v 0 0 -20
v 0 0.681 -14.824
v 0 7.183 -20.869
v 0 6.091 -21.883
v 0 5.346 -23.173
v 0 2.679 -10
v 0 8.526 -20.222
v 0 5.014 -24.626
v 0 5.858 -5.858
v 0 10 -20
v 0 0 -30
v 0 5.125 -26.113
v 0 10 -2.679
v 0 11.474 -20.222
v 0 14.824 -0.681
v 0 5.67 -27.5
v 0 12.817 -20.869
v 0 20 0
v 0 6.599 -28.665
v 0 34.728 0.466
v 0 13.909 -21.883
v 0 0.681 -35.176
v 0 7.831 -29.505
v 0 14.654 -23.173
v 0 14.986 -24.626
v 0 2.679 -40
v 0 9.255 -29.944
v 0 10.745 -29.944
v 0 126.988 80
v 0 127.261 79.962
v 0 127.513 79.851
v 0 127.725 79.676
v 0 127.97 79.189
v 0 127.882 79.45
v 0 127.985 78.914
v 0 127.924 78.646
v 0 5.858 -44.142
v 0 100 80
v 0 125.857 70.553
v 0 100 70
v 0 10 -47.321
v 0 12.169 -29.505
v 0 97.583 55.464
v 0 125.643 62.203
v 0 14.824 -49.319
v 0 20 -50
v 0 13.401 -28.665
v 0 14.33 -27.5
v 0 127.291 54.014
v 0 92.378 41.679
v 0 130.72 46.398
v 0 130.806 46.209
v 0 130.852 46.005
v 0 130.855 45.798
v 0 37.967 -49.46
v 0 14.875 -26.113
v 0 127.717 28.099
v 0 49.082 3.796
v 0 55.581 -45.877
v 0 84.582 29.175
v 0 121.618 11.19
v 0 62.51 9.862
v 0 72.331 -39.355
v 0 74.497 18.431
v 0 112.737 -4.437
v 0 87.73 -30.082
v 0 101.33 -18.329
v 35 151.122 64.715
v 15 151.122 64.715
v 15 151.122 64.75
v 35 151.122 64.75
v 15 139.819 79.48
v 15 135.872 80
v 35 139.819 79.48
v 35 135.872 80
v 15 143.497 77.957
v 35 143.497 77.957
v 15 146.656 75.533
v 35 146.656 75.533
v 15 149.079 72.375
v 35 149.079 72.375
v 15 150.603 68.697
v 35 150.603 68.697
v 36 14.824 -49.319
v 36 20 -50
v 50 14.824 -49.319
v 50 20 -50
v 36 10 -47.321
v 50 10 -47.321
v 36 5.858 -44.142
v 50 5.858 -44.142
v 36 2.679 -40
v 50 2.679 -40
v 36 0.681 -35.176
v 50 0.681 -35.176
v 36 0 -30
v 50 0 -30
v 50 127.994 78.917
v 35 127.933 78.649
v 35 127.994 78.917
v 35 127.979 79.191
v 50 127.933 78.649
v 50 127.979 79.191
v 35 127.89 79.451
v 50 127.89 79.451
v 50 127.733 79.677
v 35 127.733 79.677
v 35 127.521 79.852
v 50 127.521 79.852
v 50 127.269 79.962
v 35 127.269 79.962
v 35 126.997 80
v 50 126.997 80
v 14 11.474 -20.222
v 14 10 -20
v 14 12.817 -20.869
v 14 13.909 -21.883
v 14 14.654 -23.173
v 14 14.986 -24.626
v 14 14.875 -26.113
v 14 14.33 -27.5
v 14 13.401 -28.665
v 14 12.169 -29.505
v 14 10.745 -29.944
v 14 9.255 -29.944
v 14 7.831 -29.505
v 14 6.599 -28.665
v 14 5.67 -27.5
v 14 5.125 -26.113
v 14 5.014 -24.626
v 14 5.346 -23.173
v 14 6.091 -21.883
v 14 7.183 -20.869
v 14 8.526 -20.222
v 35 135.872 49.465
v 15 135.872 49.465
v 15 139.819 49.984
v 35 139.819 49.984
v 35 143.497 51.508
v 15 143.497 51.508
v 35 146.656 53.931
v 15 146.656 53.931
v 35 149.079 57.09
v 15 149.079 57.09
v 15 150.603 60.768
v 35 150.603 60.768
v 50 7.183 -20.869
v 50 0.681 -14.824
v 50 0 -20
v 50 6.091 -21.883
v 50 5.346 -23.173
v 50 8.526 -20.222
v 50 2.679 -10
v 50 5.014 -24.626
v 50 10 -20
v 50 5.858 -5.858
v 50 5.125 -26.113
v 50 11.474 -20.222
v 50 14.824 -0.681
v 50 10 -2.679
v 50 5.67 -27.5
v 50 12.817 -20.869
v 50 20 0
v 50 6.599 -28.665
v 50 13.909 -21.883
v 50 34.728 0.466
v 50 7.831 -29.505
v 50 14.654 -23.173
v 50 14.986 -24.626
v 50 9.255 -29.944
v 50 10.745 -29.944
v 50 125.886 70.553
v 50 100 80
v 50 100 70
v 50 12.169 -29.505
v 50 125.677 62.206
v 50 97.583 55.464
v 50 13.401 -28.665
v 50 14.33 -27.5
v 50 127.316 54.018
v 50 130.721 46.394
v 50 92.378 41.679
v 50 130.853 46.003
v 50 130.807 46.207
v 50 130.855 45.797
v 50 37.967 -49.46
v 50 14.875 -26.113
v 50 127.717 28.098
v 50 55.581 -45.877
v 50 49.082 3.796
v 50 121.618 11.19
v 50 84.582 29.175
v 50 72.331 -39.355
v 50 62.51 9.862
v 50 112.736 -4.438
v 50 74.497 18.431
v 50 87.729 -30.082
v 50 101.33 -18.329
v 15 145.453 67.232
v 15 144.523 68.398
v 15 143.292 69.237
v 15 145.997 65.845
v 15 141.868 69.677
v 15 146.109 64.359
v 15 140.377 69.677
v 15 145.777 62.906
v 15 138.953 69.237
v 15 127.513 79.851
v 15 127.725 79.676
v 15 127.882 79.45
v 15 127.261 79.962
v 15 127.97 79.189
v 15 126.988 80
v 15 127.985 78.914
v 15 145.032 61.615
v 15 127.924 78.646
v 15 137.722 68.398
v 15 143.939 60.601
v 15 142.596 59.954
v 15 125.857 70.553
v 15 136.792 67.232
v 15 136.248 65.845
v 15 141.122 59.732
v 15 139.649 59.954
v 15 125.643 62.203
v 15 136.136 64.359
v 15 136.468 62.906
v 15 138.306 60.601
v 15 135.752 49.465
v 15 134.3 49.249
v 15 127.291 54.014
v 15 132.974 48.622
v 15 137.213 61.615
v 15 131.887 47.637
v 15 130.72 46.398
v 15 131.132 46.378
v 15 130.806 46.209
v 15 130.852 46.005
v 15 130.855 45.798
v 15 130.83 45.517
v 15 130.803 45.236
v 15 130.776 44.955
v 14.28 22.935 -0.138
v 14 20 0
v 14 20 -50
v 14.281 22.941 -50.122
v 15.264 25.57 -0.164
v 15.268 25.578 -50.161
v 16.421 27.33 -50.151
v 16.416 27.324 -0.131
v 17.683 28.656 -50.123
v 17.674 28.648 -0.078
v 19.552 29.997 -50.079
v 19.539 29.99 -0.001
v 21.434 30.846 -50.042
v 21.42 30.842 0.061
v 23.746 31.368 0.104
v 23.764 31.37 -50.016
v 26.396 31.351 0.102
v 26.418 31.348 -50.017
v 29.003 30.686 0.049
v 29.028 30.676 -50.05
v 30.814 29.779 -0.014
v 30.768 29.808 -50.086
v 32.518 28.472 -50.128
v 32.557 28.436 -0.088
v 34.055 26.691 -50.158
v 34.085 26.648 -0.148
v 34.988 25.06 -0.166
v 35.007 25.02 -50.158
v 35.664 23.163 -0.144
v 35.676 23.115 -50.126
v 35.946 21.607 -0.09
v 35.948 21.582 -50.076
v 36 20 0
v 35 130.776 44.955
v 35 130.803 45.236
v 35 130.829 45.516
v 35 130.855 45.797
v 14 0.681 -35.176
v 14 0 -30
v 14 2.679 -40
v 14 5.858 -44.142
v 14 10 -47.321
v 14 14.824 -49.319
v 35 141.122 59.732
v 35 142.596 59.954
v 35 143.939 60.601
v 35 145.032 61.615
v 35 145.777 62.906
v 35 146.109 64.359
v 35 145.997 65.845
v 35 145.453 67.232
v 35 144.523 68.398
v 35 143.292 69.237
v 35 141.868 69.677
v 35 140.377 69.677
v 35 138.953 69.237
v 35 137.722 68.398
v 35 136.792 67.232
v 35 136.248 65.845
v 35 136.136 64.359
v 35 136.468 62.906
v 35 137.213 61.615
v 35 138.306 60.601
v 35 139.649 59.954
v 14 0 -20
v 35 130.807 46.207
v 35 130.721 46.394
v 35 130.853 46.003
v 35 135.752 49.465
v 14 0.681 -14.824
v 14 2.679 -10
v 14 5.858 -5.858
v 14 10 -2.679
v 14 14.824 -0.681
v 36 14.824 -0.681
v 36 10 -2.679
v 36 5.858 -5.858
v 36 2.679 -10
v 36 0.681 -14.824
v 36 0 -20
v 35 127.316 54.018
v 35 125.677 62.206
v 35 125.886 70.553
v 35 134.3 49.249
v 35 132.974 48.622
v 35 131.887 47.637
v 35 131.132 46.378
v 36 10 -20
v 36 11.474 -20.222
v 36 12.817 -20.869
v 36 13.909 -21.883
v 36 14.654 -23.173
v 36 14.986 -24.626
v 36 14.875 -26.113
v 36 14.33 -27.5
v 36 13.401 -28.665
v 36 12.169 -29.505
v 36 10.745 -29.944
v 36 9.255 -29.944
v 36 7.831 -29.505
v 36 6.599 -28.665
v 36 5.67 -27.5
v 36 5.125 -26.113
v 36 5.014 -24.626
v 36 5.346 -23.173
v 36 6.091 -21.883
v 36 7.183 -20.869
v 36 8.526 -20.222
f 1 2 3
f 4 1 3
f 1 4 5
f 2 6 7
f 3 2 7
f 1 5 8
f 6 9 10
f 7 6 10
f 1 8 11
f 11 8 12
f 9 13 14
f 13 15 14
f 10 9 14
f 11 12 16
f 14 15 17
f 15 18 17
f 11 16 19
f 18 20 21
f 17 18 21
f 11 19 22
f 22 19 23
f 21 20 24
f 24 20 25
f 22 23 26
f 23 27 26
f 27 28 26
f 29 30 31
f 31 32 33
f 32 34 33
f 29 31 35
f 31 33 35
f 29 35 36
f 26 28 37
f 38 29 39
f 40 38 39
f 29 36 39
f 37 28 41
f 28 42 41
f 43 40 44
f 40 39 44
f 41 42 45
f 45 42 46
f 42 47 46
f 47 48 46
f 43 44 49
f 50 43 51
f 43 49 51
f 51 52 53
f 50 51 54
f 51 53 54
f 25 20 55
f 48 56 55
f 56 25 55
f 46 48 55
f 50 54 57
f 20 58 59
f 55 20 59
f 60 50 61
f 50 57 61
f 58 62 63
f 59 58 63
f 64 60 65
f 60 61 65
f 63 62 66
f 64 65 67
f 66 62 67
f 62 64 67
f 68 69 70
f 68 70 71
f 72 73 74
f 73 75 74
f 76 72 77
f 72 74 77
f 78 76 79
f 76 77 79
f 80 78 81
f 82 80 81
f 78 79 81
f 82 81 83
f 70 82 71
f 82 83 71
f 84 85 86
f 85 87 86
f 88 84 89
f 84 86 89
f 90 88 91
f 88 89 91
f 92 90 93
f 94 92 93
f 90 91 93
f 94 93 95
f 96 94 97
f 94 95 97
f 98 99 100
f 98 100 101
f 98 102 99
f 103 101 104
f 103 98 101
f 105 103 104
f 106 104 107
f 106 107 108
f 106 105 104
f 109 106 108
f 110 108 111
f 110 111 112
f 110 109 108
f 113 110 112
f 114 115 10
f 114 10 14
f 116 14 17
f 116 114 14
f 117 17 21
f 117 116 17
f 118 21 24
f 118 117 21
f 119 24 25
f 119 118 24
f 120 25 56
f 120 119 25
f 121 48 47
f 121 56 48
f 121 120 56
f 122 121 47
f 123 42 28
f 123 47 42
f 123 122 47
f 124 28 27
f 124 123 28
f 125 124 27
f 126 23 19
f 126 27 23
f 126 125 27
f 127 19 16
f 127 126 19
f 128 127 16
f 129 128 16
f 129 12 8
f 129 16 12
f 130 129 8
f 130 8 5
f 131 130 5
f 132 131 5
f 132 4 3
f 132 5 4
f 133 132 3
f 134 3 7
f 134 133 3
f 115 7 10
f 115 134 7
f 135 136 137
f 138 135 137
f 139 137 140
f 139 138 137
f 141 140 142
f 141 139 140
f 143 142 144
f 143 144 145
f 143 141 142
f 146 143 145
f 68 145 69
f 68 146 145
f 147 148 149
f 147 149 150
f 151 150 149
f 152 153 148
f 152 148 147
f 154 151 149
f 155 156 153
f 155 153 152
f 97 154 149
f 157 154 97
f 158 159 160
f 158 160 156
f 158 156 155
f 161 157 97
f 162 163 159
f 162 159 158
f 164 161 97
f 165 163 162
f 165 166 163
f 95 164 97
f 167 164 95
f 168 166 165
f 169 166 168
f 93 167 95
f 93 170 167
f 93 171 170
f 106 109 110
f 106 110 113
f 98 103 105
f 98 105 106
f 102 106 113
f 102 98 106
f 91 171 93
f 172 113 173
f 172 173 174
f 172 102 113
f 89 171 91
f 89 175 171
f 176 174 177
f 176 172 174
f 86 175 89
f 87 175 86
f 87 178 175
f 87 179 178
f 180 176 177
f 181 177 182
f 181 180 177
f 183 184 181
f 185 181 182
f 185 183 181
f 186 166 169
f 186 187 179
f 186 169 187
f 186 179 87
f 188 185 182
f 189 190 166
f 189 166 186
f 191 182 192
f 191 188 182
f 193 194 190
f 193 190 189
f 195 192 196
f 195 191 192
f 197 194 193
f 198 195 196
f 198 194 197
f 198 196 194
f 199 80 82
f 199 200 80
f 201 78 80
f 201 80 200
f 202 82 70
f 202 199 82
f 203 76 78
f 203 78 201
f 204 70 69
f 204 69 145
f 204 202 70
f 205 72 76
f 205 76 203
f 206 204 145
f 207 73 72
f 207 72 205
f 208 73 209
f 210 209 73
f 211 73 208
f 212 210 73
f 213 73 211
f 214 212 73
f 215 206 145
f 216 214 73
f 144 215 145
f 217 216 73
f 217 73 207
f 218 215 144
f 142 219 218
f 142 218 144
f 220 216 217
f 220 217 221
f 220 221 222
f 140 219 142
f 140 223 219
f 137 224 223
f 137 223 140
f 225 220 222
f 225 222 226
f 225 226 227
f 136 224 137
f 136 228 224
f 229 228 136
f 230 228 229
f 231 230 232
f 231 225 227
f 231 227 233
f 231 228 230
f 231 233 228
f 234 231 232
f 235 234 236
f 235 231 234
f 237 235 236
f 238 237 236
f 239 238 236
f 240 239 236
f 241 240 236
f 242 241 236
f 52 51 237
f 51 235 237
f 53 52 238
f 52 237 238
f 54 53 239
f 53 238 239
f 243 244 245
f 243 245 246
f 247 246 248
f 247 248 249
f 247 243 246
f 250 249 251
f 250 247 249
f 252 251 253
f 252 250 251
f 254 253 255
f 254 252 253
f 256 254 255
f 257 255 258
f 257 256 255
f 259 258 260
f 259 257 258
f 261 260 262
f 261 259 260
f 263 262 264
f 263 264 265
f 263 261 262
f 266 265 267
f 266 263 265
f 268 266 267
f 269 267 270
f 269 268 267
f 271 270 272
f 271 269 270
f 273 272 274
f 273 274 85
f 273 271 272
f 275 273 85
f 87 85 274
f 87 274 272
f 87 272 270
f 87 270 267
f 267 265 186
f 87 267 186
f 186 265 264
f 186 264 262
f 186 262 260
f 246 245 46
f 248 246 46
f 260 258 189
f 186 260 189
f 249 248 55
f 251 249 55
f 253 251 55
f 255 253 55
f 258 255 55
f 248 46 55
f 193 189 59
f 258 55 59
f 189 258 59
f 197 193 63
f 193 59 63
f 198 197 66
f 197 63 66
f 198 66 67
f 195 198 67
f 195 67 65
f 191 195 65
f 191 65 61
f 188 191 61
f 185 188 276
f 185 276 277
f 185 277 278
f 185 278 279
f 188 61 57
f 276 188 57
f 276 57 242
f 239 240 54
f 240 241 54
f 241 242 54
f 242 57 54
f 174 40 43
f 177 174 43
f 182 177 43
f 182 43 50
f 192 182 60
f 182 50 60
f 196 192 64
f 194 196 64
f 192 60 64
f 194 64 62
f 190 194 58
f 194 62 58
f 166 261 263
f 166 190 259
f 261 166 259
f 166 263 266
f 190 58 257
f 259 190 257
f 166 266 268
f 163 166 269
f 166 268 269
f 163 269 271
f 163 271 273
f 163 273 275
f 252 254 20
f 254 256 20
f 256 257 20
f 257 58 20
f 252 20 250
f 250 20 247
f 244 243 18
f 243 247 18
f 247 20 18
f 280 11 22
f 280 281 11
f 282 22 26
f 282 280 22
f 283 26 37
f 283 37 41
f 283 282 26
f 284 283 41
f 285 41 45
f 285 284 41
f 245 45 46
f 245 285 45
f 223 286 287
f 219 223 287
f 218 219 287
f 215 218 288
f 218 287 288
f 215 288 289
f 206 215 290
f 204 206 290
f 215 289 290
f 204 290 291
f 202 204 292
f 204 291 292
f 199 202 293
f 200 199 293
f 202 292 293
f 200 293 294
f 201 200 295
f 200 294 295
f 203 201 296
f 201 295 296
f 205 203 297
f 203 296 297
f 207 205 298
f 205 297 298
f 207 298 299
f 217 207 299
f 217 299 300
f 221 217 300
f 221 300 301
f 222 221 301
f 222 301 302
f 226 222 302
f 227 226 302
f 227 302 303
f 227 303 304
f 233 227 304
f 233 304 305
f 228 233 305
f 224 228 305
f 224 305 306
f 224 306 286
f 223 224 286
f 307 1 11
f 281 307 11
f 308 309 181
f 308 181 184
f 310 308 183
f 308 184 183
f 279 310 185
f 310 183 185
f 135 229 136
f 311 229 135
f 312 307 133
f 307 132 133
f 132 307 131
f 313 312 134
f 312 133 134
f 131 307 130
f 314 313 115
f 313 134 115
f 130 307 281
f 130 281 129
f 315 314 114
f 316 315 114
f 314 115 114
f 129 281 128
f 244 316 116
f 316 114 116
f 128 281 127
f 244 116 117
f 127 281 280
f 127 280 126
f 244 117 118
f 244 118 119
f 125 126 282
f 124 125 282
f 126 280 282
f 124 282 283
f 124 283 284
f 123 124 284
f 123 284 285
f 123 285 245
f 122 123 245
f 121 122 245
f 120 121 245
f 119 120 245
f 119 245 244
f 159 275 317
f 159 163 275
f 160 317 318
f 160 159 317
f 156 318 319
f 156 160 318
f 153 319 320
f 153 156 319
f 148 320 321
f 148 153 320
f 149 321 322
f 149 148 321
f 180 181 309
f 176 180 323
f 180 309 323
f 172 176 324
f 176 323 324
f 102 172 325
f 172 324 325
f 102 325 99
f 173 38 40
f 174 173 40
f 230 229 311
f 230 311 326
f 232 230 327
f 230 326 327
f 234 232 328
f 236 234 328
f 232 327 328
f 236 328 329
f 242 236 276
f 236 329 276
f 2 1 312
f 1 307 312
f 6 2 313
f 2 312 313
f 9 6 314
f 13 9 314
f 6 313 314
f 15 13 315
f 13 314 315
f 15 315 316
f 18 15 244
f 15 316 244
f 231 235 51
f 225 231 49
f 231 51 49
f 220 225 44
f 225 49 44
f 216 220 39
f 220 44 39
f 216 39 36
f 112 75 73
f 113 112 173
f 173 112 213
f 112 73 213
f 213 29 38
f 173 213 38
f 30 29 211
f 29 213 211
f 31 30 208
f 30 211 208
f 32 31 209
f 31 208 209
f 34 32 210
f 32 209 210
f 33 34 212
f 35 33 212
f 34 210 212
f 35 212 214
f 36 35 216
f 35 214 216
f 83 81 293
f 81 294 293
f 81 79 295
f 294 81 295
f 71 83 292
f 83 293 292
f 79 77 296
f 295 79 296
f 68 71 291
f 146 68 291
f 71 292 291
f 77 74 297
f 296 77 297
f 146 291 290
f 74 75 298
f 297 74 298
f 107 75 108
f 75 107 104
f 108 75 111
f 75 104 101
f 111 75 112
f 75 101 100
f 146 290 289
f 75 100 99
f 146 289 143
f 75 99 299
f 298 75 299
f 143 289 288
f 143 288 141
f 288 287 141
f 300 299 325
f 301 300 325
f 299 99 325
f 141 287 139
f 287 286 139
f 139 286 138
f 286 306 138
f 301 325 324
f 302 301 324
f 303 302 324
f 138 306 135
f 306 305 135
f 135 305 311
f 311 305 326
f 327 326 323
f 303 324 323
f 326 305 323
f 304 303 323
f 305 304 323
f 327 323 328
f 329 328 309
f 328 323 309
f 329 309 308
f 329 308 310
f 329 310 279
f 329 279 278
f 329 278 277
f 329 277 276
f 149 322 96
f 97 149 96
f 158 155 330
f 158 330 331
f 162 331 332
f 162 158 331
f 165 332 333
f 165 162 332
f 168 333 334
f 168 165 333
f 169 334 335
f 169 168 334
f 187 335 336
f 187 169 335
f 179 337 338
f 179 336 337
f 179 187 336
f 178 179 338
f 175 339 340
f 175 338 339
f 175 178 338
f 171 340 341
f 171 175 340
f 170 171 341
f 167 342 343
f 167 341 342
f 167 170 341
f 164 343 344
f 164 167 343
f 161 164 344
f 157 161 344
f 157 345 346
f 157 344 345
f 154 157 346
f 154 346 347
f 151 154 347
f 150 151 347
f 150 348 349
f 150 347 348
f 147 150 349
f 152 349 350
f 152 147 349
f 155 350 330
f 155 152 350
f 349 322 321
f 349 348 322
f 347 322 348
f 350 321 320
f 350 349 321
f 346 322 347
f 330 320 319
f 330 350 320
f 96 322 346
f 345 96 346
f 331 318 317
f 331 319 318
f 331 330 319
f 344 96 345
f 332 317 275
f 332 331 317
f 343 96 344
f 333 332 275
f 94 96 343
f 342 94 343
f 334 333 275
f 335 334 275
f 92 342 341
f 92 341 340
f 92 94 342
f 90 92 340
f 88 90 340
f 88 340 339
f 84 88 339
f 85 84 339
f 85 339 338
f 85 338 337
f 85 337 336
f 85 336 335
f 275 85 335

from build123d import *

# Parameters (mm, degrees)
BOSS_EXTRUDE1_DEPTH     = 50
SKETCH3_W               = 22
SKETCH3_H               = 20
CUT_EXTRUDE2_DEPTH      = 192.293252092
CUT_EXTRUDE3_DEPTH      = 158.762822921
CUT_EXTRUDE3_DEPTH_BACK = 158.762822921
SKETCH4_R               = 5
FILLET3_R               = 20
CUT_EXTRUDE4_DEPTH      = 162.533613518
CUT_EXTRUDE4_DEPTH_BACK = 162.533613518
SKETCH6_W               = 20
SKETCH6_H               = 30.53527662
BOSS_EXTRUDE2_DEPTH     = 20
SKETCH7_R               = 5
CUT_EXTRUDE5_DEPTH      = 175.536552167
FILLET4_R               = 15.25
FILLET8_R               = 5
CUT_EXTRUDE7_START      = -15
CUT_EXTRUDE7_DEPTH      = 15
CUT_EXTRUDE8_DEPTH      = 15
FILLET13_R              = 1


with BuildPart() as part:
    # Sketch2 → Boss-Extrude1 (new body)
    with BuildSketch(Plane(origin=(0, 0, 0), x_dir=(0, 0, -1), z_dir=(1, 0, 0))):
        with BuildLine():
            Line((0, 0), (50, 0))
            Line((50, 0), (50, 20))
            ThreePointArc((50, 20), (23.281860252, 96.16106544), (-49.46472338, 131.122493479))
            Line((-49.46472338, 131.122493479), (-80, 131.122493479))
            Line((-80, 131.122493479), (-80, 100))
            Line((-80, 100), (-70, 100))
            ThreePointArc((-70, 100), (-18.431457505, 74.497474683), (0, 20))
            Line((0, 20), (0, 0))
        make_face()
    extrude(amount=BOSS_EXTRUDE1_DEPTH)

    # Sketch3 → Cut-Extrude2 (cut, through all)
    with BuildSketch(Plane(origin=(0, 0, -50), x_dir=(-1, 0, 0), z_dir=(0, 0, -1))):
        with Locations((-25, 10)):
            Rectangle(SKETCH3_W, SKETCH3_H)
    extrude(amount=-CUT_EXTRUDE2_DEPTH, mode=Mode.SUBTRACT)

    # Sketch4 → Cut-Extrude3 (cut, two sides: drawn at the far end of the back side and taken through both)
    with BuildSketch(Plane.ZY.offset(-36).offset(-CUT_EXTRUDE3_DEPTH_BACK)):
        with Locations((-25, 10)):
            Circle(SKETCH4_R)
    extrude(amount=CUT_EXTRUDE3_DEPTH + CUT_EXTRUDE3_DEPTH_BACK, mode=Mode.SUBTRACT)

    # Fillet3
    fillet3_edges = [part.edges().sort_by_distance(p)[0] for p in [
        (7, 0, 0),
        (7, 0, -50),
        (43, 0, 0),
        (43, 0, -50),
    ]]
    fillet(fillet3_edges, radius=FILLET3_R - 0.0001)  # a hair under: the kernel refuses the full size

    # Sketch5 → Cut-Extrude4 (cut, two sides: drawn at the far end of the back side and taken through both)
    with BuildSketch(Plane(origin=(0, 0, 0), x_dir=(-1, 0, 0), z_dir=(0, 0, -1)).offset(-CUT_EXTRUDE4_DEPTH_BACK)):
        with BuildLine():
            Line((-36, 20), (-14, 20))
            ThreePointArc((-14, 20), (-25, 31.439818902), (-36, 20))
        make_face()
    extrude(amount=CUT_EXTRUDE4_DEPTH + CUT_EXTRUDE4_DEPTH_BACK, mode=Mode.SUBTRACT)

    # Sketch6 → Boss-Extrude2 (add)
    with BuildSketch(Plane(origin=(0, 131.122493479, 0), x_dir=(1, 0, 0), z_dir=(0, 1, 0))):
        with Locations((25, -64.73236169)):
            Rectangle(SKETCH6_W, SKETCH6_H)
    extrude(amount=BOSS_EXTRUDE2_DEPTH)

    # Sketch7 → Cut-Extrude5 (cut, through all)
    with BuildSketch(Plane(origin=(35, 0, 0), x_dir=(0, 0, -1), z_dir=(1, 0, 0))):
        with Locations((-64.73236169, 141.122493479)):
            Circle(SKETCH7_R)
    extrude(amount=-CUT_EXTRUDE5_DEPTH, mode=Mode.SUBTRACT)

    # Fillet4
    fillet4_edges = [part.edges().sort_by_distance(p)[0] for p in [
        (25, 151.122493479, 80),
        (25, 151.122493479, 49.46472338),
    ]]
    fillet(fillet4_edges, radius=FILLET4_R)

    # Fillet8
    fillet8_edges = [part.edges().sort_by_distance(p)[0] for p in [
        (25, 131.122493479, 49.46472338),
    ]]
    fillet(fillet8_edges, radius=FILLET8_R)

    # Sketch8 → Cut-Extrude7 (cut)
    with BuildSketch(Plane(origin=(50, 0, 0), x_dir=(0, 0, -1), z_dir=(1, 0, 0)).offset(CUT_EXTRUDE7_START)):
        with BuildLine():
            Line((-80, 128.470495387), (-80, 131.122493479))
            Line((-80, 131.122493479), (-49.46472338, 131.122493479))
            ThreePointArc((-49.46472338, 131.122493479), (-47.791514438, 131.016519602), (-46.120201716, 130.883958636))
            ThreePointArc((-46.120201716, 130.883958636), (-62.771967085, 125.632452712), (-80, 128.470495387))
        make_face()
    extrude(amount=CUT_EXTRUDE7_DEPTH, mode=Mode.SUBTRACT)

    # Sketch9 → Cut-Extrude8 (cut)
    with BuildSketch(Plane.ZY):
        with BuildLine():
            Line((80, 128.467222993), (80, 131.122493479))
            Line((80, 131.122493479), (49.46472338, 131.122493479))
            ThreePointArc((49.46472338, 131.122493479), (47.79280742, 131.016611811), (46.122784424, 130.884184126))
            ThreePointArc((46.122784424, 130.884184126), (62.770455841, 125.597808373), (80, 128.467222993))
        make_face()
    extrude(amount=-CUT_EXTRUDE8_DEPTH, mode=Mode.SUBTRACT)

    # Fillet13
    fillet13_edges = [part.edges().sort_by_distance(p)[0] for p in [
        (42.5, 130.883958636, 46.120201716),
        (42.5, 128.470495387, 80),
        (7.5, 128.467222993, 80),
        (7.5, 130.884184126, 46.122784424),
    ]]
    fillet(fillet13_edges, radius=FILLET13_R)


solid = part.part
